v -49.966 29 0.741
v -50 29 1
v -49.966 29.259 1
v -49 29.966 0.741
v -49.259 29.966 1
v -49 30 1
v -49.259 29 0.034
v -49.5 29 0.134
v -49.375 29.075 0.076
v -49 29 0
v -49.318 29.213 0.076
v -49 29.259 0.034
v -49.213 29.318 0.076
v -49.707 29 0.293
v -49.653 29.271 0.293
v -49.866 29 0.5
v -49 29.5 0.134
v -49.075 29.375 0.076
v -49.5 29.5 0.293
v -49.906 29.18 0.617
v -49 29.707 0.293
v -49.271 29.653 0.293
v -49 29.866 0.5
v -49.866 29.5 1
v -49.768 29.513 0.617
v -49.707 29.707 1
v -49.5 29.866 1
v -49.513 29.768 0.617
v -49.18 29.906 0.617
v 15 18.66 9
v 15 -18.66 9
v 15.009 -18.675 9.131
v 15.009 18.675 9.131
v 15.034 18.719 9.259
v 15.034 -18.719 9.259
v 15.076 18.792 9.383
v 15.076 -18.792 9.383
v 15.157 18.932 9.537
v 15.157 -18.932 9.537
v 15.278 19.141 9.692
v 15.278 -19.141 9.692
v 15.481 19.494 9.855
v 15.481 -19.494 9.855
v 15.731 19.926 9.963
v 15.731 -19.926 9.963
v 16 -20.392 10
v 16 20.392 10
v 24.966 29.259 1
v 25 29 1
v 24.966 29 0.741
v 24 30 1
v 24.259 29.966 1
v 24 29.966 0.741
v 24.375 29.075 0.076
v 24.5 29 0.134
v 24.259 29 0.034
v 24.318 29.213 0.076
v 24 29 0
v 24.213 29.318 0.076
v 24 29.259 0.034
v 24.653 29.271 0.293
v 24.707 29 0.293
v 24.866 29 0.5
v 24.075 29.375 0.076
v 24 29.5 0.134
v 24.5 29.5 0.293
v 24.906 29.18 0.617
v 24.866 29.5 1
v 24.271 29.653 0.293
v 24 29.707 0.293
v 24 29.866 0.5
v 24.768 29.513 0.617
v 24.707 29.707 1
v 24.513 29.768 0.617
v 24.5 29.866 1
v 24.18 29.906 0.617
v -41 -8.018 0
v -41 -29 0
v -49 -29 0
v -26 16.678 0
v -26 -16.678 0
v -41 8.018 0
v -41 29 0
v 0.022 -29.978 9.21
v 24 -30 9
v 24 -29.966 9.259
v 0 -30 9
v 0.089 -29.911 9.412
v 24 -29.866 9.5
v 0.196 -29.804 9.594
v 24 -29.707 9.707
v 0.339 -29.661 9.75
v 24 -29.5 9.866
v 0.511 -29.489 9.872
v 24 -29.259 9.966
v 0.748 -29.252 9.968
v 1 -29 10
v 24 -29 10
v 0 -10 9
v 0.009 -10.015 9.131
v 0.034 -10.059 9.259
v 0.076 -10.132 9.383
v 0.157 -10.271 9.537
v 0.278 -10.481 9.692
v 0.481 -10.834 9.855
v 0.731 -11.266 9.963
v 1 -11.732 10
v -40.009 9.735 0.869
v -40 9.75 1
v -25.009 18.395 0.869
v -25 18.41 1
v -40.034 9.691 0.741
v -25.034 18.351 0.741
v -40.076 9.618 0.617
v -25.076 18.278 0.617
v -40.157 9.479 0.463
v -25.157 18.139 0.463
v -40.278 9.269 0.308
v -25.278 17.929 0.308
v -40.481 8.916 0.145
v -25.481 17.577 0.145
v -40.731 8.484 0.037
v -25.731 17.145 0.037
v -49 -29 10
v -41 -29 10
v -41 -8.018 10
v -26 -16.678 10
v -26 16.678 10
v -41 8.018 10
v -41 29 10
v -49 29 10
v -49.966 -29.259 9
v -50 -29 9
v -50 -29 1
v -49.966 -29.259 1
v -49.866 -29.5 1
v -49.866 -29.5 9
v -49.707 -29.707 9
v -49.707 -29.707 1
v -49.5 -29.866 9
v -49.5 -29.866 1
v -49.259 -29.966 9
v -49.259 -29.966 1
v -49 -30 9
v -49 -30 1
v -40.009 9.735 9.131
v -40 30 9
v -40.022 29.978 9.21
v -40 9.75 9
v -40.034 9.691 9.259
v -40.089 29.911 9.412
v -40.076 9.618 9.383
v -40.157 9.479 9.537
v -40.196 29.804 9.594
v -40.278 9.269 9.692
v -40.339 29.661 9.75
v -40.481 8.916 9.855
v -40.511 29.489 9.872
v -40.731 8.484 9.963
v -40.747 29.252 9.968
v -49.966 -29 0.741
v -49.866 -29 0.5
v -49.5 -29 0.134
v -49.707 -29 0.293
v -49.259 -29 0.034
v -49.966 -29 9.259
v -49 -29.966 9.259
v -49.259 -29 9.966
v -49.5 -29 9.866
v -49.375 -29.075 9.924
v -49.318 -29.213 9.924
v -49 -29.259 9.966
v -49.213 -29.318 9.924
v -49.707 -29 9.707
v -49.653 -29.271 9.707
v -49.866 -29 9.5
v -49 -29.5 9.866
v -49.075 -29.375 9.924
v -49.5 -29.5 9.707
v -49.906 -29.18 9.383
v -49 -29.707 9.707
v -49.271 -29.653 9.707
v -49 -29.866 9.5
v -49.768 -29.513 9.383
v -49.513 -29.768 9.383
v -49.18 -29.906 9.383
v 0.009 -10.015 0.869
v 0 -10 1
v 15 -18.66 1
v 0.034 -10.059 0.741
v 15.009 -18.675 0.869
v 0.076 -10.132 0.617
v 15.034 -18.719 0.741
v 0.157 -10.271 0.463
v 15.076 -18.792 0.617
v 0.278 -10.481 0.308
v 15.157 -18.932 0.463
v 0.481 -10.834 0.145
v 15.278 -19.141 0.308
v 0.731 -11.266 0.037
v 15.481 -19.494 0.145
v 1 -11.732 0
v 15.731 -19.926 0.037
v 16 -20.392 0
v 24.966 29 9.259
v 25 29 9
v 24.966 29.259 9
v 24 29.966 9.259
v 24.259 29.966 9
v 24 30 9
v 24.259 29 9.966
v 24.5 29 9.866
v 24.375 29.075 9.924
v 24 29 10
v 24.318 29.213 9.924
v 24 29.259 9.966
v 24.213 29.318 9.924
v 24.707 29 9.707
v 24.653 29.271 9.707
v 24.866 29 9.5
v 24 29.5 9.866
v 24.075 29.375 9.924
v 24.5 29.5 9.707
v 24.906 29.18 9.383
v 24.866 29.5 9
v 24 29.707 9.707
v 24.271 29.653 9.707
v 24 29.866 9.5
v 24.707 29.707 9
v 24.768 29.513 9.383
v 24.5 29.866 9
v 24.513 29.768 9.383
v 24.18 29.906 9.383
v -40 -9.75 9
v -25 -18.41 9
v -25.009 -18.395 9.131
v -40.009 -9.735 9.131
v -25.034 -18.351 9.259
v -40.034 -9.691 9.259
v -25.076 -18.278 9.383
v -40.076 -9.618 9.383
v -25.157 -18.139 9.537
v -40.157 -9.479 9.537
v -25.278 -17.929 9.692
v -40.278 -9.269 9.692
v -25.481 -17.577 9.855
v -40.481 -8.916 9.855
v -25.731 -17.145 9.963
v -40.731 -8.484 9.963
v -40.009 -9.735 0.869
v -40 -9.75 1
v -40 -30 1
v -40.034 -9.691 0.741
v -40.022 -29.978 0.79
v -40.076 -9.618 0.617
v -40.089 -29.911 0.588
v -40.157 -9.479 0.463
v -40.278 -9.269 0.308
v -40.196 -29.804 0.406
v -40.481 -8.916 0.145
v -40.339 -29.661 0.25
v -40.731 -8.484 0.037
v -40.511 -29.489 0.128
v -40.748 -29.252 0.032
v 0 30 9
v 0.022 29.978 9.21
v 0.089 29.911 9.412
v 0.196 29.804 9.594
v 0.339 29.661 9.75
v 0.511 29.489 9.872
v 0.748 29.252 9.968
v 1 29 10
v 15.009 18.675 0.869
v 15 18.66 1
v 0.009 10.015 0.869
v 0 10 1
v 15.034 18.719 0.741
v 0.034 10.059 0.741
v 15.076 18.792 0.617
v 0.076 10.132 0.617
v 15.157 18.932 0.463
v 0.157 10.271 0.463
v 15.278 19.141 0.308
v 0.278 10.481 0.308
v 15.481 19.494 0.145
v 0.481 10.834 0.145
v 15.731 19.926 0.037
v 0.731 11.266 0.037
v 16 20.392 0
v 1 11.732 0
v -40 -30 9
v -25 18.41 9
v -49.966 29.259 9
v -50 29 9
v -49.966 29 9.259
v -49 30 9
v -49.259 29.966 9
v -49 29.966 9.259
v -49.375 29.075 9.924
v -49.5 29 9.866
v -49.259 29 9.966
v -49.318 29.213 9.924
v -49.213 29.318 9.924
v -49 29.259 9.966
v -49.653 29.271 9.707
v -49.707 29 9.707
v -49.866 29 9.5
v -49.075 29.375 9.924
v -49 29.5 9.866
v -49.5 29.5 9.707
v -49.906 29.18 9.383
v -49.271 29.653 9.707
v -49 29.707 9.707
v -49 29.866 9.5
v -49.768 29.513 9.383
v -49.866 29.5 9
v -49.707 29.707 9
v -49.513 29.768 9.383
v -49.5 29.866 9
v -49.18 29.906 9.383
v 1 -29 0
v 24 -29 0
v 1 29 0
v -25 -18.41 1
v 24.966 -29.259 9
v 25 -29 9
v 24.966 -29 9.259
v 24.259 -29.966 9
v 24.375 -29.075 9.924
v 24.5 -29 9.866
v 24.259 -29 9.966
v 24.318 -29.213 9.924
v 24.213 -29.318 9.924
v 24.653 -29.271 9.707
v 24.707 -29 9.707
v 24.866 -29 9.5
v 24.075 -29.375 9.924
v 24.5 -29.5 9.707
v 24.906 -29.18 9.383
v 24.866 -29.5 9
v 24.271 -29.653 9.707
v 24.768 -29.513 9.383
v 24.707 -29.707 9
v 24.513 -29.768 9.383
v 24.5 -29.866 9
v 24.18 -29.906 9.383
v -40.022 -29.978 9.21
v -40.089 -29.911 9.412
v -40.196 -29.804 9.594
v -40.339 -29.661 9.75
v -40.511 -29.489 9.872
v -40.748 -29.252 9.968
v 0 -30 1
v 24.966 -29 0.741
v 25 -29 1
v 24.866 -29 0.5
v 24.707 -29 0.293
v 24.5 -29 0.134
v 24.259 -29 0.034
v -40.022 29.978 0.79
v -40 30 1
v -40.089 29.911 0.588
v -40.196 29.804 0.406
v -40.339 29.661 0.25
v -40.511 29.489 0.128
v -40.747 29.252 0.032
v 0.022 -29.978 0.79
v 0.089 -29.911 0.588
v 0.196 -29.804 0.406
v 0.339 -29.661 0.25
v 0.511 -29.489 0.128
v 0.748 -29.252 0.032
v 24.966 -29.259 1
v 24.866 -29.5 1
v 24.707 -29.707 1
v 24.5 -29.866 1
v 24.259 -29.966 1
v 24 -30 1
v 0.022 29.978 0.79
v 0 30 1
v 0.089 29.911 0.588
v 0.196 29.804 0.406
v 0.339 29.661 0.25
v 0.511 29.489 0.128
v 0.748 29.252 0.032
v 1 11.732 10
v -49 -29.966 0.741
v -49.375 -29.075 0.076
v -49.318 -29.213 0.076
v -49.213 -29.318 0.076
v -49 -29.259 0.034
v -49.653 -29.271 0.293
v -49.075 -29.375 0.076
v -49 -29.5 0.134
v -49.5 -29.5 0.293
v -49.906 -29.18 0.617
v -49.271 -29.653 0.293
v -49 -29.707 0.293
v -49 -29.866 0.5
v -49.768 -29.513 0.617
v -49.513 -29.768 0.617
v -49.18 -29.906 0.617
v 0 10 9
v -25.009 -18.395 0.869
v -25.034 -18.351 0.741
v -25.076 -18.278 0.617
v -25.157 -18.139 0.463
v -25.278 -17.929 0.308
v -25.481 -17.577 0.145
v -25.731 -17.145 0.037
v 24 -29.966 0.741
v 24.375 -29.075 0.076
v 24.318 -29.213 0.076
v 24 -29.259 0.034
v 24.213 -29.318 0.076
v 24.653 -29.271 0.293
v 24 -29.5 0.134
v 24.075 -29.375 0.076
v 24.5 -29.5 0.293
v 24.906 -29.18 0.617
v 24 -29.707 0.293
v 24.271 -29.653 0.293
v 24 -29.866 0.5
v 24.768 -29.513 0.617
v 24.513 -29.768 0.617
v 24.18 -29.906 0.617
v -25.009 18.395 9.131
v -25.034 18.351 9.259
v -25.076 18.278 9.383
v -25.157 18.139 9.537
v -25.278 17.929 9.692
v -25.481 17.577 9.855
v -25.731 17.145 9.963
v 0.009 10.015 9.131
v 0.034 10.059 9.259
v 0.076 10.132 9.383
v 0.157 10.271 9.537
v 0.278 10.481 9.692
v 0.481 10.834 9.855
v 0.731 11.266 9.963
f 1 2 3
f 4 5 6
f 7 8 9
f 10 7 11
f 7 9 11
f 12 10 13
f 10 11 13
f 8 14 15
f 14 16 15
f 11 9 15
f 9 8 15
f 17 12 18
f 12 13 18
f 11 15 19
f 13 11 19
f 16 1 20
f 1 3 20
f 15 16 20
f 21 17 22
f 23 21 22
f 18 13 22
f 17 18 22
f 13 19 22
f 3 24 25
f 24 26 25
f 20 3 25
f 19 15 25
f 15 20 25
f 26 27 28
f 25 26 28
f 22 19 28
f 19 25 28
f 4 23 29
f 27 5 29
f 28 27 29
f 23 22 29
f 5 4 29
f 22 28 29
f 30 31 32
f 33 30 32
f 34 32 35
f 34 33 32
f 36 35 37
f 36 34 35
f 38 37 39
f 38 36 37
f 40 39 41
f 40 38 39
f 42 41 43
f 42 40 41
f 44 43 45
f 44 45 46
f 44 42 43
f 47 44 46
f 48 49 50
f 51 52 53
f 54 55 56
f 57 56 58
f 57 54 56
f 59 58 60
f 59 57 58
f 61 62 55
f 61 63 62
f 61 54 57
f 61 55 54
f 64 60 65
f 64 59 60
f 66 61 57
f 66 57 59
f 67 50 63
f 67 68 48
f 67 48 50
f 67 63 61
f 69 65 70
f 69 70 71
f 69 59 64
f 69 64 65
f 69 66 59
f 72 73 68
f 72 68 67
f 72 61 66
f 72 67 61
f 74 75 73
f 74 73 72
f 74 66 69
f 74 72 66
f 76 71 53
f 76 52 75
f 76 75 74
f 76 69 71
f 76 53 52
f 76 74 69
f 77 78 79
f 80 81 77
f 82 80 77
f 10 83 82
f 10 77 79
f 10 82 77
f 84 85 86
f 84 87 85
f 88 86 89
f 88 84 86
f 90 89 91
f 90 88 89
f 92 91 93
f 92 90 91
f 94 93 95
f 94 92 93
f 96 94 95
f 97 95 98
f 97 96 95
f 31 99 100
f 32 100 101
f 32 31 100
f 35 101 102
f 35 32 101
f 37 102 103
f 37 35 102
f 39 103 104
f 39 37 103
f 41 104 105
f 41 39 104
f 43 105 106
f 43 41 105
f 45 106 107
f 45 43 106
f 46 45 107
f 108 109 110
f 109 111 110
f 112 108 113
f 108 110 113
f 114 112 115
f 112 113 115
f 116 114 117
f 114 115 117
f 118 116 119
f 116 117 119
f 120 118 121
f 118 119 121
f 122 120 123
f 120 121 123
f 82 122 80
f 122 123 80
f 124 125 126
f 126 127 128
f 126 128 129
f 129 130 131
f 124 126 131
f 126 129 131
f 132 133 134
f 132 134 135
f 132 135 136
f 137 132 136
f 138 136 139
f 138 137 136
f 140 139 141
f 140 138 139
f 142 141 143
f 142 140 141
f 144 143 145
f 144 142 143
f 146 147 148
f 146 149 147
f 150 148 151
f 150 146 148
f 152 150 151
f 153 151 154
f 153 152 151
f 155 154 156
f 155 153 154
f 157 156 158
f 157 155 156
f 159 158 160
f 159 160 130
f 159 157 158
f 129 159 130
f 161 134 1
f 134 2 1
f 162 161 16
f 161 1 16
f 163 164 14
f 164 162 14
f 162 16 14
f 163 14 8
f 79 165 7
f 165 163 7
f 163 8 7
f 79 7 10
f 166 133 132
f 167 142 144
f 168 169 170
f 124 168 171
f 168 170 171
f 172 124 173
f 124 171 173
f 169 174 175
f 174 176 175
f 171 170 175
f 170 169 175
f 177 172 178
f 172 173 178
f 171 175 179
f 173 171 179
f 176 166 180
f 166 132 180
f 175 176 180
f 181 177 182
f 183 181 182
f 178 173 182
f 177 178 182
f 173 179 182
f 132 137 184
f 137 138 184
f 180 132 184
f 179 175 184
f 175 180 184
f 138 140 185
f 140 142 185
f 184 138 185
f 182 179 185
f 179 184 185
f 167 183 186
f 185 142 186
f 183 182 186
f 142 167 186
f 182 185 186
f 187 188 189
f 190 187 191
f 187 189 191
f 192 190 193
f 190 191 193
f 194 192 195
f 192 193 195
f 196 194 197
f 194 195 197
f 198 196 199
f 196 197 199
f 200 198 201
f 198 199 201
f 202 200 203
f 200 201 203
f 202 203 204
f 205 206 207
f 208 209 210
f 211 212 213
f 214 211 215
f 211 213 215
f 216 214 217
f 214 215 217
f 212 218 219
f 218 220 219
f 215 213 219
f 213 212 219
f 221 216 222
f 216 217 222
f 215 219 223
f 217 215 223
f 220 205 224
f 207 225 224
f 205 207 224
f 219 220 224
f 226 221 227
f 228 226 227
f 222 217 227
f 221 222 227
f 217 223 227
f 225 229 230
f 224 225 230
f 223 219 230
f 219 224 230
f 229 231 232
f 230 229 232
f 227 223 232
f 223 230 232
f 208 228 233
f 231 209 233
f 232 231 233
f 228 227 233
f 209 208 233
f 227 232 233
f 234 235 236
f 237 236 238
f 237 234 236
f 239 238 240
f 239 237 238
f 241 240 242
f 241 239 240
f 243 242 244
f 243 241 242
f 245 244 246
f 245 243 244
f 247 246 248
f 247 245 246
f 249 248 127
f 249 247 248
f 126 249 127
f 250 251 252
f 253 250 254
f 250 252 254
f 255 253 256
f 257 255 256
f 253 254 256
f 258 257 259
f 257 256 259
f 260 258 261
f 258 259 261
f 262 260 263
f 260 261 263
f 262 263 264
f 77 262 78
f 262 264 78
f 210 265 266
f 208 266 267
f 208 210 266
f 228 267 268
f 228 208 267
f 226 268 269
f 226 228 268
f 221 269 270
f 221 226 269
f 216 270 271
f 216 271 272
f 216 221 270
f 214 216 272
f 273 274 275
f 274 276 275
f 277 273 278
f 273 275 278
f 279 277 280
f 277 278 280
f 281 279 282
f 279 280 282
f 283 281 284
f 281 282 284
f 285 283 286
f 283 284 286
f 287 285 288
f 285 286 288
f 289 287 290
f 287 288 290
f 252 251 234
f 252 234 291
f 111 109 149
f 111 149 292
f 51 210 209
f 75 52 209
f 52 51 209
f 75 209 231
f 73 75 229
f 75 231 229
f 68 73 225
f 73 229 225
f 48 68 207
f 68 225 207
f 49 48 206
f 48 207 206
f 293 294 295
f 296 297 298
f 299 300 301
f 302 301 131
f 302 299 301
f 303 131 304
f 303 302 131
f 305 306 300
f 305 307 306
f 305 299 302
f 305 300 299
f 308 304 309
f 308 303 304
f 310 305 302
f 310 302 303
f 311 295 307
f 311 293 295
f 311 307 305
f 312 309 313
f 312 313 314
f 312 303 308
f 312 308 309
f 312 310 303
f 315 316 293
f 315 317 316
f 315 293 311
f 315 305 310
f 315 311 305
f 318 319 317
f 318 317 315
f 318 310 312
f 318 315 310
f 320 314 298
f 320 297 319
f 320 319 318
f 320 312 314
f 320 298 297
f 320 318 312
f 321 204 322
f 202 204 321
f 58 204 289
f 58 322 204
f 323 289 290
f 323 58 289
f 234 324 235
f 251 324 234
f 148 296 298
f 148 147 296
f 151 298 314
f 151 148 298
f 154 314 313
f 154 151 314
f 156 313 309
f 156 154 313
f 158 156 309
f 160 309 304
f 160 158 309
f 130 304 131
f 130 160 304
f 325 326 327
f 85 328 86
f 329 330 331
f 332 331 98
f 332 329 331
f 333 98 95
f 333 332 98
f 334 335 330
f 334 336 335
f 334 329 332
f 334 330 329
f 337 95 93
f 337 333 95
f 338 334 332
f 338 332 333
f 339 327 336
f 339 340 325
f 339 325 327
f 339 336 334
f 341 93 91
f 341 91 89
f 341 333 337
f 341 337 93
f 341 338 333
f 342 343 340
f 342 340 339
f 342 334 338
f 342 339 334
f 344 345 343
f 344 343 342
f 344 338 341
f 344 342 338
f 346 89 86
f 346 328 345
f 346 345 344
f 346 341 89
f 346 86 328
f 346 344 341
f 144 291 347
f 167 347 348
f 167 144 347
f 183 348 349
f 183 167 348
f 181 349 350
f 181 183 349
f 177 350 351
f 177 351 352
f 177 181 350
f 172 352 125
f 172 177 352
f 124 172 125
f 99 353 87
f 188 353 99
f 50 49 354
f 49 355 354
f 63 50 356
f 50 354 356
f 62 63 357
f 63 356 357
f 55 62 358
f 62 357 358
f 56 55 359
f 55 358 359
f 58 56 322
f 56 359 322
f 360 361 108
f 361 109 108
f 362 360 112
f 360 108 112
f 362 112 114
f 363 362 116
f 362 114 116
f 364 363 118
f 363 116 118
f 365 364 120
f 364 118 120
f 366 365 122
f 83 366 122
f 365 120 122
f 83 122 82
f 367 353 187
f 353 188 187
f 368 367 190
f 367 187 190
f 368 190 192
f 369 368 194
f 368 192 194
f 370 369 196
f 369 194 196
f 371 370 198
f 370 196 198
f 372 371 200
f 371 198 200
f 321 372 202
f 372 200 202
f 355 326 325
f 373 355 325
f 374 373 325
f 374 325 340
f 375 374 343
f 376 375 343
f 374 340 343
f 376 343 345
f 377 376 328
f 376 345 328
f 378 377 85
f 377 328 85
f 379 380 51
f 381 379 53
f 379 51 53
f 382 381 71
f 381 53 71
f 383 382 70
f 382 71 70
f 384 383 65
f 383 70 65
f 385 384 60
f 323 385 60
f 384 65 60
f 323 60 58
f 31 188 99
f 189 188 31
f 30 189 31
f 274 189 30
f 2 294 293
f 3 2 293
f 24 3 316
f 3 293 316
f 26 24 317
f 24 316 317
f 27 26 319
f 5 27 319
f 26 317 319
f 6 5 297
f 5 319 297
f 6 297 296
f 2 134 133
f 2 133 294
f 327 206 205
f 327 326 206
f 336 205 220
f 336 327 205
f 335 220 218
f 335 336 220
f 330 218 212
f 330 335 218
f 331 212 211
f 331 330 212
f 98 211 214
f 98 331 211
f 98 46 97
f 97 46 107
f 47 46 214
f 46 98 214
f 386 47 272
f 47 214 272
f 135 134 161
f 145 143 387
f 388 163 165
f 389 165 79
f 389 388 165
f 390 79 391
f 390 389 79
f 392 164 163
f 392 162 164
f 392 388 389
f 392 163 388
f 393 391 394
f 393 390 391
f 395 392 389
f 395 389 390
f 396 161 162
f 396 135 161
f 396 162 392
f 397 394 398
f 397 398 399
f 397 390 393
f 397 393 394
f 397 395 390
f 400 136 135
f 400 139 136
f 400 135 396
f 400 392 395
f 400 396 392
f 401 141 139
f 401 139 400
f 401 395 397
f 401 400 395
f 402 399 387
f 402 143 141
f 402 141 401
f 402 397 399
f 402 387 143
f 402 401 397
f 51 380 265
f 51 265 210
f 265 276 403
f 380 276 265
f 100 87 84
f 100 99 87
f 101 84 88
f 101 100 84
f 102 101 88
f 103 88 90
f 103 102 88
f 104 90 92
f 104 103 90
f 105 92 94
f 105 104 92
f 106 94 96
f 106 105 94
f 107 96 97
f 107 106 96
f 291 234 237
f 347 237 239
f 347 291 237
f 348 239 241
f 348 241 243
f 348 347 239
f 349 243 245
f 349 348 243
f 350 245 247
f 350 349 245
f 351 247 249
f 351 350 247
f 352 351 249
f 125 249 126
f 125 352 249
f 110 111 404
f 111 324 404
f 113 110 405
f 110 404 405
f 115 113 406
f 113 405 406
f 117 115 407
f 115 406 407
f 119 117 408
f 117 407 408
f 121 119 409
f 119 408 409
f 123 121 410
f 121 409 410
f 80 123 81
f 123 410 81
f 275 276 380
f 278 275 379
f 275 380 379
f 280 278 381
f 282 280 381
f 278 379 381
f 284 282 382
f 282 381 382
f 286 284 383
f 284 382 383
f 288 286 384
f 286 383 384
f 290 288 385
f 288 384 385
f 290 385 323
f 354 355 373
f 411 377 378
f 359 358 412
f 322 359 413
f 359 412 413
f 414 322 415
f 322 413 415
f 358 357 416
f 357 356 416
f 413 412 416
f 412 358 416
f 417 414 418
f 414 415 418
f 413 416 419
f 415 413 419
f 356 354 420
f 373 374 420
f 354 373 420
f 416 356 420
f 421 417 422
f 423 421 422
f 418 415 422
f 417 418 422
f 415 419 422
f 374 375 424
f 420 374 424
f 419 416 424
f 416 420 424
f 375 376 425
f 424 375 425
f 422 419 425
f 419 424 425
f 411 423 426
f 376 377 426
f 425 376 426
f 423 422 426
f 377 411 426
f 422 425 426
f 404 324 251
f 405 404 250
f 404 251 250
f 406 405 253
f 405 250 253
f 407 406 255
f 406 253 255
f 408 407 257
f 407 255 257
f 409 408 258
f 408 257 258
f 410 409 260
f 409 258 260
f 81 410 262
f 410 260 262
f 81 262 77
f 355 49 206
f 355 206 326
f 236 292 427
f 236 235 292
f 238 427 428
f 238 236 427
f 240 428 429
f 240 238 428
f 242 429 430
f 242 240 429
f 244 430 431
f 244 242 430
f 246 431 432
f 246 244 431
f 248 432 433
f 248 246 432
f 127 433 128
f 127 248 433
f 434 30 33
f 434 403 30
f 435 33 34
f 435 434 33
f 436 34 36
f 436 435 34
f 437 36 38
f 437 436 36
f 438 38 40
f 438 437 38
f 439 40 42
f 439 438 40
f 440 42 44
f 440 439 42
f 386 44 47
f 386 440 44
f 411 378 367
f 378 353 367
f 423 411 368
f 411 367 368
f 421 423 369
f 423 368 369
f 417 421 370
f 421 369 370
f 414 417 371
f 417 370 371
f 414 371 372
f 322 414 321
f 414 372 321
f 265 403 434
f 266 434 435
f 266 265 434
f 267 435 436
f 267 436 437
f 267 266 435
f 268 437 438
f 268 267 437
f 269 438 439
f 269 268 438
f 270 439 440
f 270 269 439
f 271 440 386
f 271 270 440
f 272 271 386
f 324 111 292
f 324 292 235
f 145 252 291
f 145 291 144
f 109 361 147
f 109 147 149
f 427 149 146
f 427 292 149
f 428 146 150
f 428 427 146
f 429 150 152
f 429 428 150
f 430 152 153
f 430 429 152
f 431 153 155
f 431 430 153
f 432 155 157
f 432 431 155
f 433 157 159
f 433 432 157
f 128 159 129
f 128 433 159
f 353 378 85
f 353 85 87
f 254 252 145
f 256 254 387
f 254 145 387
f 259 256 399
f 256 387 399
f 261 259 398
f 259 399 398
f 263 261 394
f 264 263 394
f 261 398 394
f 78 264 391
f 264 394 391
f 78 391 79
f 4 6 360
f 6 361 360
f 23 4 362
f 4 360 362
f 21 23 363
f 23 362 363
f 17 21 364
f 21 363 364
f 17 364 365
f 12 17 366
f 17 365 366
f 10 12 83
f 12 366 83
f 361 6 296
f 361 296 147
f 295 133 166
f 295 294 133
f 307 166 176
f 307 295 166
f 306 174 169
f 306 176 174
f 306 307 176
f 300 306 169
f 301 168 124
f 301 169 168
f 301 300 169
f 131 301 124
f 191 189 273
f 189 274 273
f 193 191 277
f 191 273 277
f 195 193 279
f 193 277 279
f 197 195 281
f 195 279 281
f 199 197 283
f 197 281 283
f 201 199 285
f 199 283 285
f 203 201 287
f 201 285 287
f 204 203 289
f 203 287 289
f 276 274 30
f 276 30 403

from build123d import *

# Parameters (mm, degrees)
PAD_DEPTH    = 10
FILLET001_R  = 1
PAD001_DEPTH = 10
FILLET_R     = 1


with BuildPart() as body:
    # Sketch → Pad (new body)
    with BuildSketch(Plane.XY):
        Polygon((0, -30), (0, -10), (15, -18.660254), (15, 18.660254), (0, 10), (0, 30), (25, 30), (25, -30), align=None)
    extrude(amount=PAD_DEPTH)

    # Fillet001
    fillet001_edges = [body.edges().sort_by_distance(p)[0] for p in [
        (25, 30, 5),
        (25, -30, 5),
        (25, 0, 0),
        (25, 0, 10),
        (12.5, -30, 10),
        (12.5, -30, 0),
        (12.5, 30, 10),
        (12.5, 30, 0),
        (0, -20, 0),
        (7.5, -14.330127, 0),
        (15, 0, 0),
        (7.5, 14.330127, 0),
        (0, 20, 0),
        (0, -20, 10),
        (7.5, -14.330127, 10),
        (15, 0, 10),
        (7.5, 14.330127, 10),
        (0, 20, 10),
    ]]
    fillet(fillet001_edges, radius=FILLET001_R)


with BuildPart() as body001:
    # Sketch002 → Pad001 (new body)
    with BuildSketch(Plane.XY):
        Polygon((-50, -30), (-49.99998, 30), (-39.99998, 29.999993), (-40, 9.75), (-25.000012, 18.410219), (-25, -18.410242), (-40.000007, -9.75), (-40, -30), align=None)
    extrude(amount=PAD001_DEPTH)

    # Fillet
    fillet_edges = [body001.edges().sort_by_distance(p)[0] for p in [
        (-50, -30, 5),
        (-49.99998, 30, 5),
        (-49.99999, 0, 0),
        (-49.99999, 0, 10),
        (-44.99998, 29.999997, 0),
        (-44.99998, 29.999997, 10),
        (-45, -30, 0),
        (-45, -30, 10),
        (-39.99999, 19.874997, 0),
        (-32.500006, 14.080109, 0),
        (-25.000006, -1.2e-05, 0),
        (-32.500003, -14.080121, 0),
        (-40.000003, -19.875, 0),
        (-39.99999, 19.874997, 10),
        (-32.500006, 14.080109, 10),
        (-25.000006, -1.2e-05, 10),
        (-32.500003, -14.080121, 10),
        (-40.000003, -19.875, 10),
    ]]
    fillet(fillet_edges, radius=FILLET_R)


solid = Compound([body.part, body001.part])
